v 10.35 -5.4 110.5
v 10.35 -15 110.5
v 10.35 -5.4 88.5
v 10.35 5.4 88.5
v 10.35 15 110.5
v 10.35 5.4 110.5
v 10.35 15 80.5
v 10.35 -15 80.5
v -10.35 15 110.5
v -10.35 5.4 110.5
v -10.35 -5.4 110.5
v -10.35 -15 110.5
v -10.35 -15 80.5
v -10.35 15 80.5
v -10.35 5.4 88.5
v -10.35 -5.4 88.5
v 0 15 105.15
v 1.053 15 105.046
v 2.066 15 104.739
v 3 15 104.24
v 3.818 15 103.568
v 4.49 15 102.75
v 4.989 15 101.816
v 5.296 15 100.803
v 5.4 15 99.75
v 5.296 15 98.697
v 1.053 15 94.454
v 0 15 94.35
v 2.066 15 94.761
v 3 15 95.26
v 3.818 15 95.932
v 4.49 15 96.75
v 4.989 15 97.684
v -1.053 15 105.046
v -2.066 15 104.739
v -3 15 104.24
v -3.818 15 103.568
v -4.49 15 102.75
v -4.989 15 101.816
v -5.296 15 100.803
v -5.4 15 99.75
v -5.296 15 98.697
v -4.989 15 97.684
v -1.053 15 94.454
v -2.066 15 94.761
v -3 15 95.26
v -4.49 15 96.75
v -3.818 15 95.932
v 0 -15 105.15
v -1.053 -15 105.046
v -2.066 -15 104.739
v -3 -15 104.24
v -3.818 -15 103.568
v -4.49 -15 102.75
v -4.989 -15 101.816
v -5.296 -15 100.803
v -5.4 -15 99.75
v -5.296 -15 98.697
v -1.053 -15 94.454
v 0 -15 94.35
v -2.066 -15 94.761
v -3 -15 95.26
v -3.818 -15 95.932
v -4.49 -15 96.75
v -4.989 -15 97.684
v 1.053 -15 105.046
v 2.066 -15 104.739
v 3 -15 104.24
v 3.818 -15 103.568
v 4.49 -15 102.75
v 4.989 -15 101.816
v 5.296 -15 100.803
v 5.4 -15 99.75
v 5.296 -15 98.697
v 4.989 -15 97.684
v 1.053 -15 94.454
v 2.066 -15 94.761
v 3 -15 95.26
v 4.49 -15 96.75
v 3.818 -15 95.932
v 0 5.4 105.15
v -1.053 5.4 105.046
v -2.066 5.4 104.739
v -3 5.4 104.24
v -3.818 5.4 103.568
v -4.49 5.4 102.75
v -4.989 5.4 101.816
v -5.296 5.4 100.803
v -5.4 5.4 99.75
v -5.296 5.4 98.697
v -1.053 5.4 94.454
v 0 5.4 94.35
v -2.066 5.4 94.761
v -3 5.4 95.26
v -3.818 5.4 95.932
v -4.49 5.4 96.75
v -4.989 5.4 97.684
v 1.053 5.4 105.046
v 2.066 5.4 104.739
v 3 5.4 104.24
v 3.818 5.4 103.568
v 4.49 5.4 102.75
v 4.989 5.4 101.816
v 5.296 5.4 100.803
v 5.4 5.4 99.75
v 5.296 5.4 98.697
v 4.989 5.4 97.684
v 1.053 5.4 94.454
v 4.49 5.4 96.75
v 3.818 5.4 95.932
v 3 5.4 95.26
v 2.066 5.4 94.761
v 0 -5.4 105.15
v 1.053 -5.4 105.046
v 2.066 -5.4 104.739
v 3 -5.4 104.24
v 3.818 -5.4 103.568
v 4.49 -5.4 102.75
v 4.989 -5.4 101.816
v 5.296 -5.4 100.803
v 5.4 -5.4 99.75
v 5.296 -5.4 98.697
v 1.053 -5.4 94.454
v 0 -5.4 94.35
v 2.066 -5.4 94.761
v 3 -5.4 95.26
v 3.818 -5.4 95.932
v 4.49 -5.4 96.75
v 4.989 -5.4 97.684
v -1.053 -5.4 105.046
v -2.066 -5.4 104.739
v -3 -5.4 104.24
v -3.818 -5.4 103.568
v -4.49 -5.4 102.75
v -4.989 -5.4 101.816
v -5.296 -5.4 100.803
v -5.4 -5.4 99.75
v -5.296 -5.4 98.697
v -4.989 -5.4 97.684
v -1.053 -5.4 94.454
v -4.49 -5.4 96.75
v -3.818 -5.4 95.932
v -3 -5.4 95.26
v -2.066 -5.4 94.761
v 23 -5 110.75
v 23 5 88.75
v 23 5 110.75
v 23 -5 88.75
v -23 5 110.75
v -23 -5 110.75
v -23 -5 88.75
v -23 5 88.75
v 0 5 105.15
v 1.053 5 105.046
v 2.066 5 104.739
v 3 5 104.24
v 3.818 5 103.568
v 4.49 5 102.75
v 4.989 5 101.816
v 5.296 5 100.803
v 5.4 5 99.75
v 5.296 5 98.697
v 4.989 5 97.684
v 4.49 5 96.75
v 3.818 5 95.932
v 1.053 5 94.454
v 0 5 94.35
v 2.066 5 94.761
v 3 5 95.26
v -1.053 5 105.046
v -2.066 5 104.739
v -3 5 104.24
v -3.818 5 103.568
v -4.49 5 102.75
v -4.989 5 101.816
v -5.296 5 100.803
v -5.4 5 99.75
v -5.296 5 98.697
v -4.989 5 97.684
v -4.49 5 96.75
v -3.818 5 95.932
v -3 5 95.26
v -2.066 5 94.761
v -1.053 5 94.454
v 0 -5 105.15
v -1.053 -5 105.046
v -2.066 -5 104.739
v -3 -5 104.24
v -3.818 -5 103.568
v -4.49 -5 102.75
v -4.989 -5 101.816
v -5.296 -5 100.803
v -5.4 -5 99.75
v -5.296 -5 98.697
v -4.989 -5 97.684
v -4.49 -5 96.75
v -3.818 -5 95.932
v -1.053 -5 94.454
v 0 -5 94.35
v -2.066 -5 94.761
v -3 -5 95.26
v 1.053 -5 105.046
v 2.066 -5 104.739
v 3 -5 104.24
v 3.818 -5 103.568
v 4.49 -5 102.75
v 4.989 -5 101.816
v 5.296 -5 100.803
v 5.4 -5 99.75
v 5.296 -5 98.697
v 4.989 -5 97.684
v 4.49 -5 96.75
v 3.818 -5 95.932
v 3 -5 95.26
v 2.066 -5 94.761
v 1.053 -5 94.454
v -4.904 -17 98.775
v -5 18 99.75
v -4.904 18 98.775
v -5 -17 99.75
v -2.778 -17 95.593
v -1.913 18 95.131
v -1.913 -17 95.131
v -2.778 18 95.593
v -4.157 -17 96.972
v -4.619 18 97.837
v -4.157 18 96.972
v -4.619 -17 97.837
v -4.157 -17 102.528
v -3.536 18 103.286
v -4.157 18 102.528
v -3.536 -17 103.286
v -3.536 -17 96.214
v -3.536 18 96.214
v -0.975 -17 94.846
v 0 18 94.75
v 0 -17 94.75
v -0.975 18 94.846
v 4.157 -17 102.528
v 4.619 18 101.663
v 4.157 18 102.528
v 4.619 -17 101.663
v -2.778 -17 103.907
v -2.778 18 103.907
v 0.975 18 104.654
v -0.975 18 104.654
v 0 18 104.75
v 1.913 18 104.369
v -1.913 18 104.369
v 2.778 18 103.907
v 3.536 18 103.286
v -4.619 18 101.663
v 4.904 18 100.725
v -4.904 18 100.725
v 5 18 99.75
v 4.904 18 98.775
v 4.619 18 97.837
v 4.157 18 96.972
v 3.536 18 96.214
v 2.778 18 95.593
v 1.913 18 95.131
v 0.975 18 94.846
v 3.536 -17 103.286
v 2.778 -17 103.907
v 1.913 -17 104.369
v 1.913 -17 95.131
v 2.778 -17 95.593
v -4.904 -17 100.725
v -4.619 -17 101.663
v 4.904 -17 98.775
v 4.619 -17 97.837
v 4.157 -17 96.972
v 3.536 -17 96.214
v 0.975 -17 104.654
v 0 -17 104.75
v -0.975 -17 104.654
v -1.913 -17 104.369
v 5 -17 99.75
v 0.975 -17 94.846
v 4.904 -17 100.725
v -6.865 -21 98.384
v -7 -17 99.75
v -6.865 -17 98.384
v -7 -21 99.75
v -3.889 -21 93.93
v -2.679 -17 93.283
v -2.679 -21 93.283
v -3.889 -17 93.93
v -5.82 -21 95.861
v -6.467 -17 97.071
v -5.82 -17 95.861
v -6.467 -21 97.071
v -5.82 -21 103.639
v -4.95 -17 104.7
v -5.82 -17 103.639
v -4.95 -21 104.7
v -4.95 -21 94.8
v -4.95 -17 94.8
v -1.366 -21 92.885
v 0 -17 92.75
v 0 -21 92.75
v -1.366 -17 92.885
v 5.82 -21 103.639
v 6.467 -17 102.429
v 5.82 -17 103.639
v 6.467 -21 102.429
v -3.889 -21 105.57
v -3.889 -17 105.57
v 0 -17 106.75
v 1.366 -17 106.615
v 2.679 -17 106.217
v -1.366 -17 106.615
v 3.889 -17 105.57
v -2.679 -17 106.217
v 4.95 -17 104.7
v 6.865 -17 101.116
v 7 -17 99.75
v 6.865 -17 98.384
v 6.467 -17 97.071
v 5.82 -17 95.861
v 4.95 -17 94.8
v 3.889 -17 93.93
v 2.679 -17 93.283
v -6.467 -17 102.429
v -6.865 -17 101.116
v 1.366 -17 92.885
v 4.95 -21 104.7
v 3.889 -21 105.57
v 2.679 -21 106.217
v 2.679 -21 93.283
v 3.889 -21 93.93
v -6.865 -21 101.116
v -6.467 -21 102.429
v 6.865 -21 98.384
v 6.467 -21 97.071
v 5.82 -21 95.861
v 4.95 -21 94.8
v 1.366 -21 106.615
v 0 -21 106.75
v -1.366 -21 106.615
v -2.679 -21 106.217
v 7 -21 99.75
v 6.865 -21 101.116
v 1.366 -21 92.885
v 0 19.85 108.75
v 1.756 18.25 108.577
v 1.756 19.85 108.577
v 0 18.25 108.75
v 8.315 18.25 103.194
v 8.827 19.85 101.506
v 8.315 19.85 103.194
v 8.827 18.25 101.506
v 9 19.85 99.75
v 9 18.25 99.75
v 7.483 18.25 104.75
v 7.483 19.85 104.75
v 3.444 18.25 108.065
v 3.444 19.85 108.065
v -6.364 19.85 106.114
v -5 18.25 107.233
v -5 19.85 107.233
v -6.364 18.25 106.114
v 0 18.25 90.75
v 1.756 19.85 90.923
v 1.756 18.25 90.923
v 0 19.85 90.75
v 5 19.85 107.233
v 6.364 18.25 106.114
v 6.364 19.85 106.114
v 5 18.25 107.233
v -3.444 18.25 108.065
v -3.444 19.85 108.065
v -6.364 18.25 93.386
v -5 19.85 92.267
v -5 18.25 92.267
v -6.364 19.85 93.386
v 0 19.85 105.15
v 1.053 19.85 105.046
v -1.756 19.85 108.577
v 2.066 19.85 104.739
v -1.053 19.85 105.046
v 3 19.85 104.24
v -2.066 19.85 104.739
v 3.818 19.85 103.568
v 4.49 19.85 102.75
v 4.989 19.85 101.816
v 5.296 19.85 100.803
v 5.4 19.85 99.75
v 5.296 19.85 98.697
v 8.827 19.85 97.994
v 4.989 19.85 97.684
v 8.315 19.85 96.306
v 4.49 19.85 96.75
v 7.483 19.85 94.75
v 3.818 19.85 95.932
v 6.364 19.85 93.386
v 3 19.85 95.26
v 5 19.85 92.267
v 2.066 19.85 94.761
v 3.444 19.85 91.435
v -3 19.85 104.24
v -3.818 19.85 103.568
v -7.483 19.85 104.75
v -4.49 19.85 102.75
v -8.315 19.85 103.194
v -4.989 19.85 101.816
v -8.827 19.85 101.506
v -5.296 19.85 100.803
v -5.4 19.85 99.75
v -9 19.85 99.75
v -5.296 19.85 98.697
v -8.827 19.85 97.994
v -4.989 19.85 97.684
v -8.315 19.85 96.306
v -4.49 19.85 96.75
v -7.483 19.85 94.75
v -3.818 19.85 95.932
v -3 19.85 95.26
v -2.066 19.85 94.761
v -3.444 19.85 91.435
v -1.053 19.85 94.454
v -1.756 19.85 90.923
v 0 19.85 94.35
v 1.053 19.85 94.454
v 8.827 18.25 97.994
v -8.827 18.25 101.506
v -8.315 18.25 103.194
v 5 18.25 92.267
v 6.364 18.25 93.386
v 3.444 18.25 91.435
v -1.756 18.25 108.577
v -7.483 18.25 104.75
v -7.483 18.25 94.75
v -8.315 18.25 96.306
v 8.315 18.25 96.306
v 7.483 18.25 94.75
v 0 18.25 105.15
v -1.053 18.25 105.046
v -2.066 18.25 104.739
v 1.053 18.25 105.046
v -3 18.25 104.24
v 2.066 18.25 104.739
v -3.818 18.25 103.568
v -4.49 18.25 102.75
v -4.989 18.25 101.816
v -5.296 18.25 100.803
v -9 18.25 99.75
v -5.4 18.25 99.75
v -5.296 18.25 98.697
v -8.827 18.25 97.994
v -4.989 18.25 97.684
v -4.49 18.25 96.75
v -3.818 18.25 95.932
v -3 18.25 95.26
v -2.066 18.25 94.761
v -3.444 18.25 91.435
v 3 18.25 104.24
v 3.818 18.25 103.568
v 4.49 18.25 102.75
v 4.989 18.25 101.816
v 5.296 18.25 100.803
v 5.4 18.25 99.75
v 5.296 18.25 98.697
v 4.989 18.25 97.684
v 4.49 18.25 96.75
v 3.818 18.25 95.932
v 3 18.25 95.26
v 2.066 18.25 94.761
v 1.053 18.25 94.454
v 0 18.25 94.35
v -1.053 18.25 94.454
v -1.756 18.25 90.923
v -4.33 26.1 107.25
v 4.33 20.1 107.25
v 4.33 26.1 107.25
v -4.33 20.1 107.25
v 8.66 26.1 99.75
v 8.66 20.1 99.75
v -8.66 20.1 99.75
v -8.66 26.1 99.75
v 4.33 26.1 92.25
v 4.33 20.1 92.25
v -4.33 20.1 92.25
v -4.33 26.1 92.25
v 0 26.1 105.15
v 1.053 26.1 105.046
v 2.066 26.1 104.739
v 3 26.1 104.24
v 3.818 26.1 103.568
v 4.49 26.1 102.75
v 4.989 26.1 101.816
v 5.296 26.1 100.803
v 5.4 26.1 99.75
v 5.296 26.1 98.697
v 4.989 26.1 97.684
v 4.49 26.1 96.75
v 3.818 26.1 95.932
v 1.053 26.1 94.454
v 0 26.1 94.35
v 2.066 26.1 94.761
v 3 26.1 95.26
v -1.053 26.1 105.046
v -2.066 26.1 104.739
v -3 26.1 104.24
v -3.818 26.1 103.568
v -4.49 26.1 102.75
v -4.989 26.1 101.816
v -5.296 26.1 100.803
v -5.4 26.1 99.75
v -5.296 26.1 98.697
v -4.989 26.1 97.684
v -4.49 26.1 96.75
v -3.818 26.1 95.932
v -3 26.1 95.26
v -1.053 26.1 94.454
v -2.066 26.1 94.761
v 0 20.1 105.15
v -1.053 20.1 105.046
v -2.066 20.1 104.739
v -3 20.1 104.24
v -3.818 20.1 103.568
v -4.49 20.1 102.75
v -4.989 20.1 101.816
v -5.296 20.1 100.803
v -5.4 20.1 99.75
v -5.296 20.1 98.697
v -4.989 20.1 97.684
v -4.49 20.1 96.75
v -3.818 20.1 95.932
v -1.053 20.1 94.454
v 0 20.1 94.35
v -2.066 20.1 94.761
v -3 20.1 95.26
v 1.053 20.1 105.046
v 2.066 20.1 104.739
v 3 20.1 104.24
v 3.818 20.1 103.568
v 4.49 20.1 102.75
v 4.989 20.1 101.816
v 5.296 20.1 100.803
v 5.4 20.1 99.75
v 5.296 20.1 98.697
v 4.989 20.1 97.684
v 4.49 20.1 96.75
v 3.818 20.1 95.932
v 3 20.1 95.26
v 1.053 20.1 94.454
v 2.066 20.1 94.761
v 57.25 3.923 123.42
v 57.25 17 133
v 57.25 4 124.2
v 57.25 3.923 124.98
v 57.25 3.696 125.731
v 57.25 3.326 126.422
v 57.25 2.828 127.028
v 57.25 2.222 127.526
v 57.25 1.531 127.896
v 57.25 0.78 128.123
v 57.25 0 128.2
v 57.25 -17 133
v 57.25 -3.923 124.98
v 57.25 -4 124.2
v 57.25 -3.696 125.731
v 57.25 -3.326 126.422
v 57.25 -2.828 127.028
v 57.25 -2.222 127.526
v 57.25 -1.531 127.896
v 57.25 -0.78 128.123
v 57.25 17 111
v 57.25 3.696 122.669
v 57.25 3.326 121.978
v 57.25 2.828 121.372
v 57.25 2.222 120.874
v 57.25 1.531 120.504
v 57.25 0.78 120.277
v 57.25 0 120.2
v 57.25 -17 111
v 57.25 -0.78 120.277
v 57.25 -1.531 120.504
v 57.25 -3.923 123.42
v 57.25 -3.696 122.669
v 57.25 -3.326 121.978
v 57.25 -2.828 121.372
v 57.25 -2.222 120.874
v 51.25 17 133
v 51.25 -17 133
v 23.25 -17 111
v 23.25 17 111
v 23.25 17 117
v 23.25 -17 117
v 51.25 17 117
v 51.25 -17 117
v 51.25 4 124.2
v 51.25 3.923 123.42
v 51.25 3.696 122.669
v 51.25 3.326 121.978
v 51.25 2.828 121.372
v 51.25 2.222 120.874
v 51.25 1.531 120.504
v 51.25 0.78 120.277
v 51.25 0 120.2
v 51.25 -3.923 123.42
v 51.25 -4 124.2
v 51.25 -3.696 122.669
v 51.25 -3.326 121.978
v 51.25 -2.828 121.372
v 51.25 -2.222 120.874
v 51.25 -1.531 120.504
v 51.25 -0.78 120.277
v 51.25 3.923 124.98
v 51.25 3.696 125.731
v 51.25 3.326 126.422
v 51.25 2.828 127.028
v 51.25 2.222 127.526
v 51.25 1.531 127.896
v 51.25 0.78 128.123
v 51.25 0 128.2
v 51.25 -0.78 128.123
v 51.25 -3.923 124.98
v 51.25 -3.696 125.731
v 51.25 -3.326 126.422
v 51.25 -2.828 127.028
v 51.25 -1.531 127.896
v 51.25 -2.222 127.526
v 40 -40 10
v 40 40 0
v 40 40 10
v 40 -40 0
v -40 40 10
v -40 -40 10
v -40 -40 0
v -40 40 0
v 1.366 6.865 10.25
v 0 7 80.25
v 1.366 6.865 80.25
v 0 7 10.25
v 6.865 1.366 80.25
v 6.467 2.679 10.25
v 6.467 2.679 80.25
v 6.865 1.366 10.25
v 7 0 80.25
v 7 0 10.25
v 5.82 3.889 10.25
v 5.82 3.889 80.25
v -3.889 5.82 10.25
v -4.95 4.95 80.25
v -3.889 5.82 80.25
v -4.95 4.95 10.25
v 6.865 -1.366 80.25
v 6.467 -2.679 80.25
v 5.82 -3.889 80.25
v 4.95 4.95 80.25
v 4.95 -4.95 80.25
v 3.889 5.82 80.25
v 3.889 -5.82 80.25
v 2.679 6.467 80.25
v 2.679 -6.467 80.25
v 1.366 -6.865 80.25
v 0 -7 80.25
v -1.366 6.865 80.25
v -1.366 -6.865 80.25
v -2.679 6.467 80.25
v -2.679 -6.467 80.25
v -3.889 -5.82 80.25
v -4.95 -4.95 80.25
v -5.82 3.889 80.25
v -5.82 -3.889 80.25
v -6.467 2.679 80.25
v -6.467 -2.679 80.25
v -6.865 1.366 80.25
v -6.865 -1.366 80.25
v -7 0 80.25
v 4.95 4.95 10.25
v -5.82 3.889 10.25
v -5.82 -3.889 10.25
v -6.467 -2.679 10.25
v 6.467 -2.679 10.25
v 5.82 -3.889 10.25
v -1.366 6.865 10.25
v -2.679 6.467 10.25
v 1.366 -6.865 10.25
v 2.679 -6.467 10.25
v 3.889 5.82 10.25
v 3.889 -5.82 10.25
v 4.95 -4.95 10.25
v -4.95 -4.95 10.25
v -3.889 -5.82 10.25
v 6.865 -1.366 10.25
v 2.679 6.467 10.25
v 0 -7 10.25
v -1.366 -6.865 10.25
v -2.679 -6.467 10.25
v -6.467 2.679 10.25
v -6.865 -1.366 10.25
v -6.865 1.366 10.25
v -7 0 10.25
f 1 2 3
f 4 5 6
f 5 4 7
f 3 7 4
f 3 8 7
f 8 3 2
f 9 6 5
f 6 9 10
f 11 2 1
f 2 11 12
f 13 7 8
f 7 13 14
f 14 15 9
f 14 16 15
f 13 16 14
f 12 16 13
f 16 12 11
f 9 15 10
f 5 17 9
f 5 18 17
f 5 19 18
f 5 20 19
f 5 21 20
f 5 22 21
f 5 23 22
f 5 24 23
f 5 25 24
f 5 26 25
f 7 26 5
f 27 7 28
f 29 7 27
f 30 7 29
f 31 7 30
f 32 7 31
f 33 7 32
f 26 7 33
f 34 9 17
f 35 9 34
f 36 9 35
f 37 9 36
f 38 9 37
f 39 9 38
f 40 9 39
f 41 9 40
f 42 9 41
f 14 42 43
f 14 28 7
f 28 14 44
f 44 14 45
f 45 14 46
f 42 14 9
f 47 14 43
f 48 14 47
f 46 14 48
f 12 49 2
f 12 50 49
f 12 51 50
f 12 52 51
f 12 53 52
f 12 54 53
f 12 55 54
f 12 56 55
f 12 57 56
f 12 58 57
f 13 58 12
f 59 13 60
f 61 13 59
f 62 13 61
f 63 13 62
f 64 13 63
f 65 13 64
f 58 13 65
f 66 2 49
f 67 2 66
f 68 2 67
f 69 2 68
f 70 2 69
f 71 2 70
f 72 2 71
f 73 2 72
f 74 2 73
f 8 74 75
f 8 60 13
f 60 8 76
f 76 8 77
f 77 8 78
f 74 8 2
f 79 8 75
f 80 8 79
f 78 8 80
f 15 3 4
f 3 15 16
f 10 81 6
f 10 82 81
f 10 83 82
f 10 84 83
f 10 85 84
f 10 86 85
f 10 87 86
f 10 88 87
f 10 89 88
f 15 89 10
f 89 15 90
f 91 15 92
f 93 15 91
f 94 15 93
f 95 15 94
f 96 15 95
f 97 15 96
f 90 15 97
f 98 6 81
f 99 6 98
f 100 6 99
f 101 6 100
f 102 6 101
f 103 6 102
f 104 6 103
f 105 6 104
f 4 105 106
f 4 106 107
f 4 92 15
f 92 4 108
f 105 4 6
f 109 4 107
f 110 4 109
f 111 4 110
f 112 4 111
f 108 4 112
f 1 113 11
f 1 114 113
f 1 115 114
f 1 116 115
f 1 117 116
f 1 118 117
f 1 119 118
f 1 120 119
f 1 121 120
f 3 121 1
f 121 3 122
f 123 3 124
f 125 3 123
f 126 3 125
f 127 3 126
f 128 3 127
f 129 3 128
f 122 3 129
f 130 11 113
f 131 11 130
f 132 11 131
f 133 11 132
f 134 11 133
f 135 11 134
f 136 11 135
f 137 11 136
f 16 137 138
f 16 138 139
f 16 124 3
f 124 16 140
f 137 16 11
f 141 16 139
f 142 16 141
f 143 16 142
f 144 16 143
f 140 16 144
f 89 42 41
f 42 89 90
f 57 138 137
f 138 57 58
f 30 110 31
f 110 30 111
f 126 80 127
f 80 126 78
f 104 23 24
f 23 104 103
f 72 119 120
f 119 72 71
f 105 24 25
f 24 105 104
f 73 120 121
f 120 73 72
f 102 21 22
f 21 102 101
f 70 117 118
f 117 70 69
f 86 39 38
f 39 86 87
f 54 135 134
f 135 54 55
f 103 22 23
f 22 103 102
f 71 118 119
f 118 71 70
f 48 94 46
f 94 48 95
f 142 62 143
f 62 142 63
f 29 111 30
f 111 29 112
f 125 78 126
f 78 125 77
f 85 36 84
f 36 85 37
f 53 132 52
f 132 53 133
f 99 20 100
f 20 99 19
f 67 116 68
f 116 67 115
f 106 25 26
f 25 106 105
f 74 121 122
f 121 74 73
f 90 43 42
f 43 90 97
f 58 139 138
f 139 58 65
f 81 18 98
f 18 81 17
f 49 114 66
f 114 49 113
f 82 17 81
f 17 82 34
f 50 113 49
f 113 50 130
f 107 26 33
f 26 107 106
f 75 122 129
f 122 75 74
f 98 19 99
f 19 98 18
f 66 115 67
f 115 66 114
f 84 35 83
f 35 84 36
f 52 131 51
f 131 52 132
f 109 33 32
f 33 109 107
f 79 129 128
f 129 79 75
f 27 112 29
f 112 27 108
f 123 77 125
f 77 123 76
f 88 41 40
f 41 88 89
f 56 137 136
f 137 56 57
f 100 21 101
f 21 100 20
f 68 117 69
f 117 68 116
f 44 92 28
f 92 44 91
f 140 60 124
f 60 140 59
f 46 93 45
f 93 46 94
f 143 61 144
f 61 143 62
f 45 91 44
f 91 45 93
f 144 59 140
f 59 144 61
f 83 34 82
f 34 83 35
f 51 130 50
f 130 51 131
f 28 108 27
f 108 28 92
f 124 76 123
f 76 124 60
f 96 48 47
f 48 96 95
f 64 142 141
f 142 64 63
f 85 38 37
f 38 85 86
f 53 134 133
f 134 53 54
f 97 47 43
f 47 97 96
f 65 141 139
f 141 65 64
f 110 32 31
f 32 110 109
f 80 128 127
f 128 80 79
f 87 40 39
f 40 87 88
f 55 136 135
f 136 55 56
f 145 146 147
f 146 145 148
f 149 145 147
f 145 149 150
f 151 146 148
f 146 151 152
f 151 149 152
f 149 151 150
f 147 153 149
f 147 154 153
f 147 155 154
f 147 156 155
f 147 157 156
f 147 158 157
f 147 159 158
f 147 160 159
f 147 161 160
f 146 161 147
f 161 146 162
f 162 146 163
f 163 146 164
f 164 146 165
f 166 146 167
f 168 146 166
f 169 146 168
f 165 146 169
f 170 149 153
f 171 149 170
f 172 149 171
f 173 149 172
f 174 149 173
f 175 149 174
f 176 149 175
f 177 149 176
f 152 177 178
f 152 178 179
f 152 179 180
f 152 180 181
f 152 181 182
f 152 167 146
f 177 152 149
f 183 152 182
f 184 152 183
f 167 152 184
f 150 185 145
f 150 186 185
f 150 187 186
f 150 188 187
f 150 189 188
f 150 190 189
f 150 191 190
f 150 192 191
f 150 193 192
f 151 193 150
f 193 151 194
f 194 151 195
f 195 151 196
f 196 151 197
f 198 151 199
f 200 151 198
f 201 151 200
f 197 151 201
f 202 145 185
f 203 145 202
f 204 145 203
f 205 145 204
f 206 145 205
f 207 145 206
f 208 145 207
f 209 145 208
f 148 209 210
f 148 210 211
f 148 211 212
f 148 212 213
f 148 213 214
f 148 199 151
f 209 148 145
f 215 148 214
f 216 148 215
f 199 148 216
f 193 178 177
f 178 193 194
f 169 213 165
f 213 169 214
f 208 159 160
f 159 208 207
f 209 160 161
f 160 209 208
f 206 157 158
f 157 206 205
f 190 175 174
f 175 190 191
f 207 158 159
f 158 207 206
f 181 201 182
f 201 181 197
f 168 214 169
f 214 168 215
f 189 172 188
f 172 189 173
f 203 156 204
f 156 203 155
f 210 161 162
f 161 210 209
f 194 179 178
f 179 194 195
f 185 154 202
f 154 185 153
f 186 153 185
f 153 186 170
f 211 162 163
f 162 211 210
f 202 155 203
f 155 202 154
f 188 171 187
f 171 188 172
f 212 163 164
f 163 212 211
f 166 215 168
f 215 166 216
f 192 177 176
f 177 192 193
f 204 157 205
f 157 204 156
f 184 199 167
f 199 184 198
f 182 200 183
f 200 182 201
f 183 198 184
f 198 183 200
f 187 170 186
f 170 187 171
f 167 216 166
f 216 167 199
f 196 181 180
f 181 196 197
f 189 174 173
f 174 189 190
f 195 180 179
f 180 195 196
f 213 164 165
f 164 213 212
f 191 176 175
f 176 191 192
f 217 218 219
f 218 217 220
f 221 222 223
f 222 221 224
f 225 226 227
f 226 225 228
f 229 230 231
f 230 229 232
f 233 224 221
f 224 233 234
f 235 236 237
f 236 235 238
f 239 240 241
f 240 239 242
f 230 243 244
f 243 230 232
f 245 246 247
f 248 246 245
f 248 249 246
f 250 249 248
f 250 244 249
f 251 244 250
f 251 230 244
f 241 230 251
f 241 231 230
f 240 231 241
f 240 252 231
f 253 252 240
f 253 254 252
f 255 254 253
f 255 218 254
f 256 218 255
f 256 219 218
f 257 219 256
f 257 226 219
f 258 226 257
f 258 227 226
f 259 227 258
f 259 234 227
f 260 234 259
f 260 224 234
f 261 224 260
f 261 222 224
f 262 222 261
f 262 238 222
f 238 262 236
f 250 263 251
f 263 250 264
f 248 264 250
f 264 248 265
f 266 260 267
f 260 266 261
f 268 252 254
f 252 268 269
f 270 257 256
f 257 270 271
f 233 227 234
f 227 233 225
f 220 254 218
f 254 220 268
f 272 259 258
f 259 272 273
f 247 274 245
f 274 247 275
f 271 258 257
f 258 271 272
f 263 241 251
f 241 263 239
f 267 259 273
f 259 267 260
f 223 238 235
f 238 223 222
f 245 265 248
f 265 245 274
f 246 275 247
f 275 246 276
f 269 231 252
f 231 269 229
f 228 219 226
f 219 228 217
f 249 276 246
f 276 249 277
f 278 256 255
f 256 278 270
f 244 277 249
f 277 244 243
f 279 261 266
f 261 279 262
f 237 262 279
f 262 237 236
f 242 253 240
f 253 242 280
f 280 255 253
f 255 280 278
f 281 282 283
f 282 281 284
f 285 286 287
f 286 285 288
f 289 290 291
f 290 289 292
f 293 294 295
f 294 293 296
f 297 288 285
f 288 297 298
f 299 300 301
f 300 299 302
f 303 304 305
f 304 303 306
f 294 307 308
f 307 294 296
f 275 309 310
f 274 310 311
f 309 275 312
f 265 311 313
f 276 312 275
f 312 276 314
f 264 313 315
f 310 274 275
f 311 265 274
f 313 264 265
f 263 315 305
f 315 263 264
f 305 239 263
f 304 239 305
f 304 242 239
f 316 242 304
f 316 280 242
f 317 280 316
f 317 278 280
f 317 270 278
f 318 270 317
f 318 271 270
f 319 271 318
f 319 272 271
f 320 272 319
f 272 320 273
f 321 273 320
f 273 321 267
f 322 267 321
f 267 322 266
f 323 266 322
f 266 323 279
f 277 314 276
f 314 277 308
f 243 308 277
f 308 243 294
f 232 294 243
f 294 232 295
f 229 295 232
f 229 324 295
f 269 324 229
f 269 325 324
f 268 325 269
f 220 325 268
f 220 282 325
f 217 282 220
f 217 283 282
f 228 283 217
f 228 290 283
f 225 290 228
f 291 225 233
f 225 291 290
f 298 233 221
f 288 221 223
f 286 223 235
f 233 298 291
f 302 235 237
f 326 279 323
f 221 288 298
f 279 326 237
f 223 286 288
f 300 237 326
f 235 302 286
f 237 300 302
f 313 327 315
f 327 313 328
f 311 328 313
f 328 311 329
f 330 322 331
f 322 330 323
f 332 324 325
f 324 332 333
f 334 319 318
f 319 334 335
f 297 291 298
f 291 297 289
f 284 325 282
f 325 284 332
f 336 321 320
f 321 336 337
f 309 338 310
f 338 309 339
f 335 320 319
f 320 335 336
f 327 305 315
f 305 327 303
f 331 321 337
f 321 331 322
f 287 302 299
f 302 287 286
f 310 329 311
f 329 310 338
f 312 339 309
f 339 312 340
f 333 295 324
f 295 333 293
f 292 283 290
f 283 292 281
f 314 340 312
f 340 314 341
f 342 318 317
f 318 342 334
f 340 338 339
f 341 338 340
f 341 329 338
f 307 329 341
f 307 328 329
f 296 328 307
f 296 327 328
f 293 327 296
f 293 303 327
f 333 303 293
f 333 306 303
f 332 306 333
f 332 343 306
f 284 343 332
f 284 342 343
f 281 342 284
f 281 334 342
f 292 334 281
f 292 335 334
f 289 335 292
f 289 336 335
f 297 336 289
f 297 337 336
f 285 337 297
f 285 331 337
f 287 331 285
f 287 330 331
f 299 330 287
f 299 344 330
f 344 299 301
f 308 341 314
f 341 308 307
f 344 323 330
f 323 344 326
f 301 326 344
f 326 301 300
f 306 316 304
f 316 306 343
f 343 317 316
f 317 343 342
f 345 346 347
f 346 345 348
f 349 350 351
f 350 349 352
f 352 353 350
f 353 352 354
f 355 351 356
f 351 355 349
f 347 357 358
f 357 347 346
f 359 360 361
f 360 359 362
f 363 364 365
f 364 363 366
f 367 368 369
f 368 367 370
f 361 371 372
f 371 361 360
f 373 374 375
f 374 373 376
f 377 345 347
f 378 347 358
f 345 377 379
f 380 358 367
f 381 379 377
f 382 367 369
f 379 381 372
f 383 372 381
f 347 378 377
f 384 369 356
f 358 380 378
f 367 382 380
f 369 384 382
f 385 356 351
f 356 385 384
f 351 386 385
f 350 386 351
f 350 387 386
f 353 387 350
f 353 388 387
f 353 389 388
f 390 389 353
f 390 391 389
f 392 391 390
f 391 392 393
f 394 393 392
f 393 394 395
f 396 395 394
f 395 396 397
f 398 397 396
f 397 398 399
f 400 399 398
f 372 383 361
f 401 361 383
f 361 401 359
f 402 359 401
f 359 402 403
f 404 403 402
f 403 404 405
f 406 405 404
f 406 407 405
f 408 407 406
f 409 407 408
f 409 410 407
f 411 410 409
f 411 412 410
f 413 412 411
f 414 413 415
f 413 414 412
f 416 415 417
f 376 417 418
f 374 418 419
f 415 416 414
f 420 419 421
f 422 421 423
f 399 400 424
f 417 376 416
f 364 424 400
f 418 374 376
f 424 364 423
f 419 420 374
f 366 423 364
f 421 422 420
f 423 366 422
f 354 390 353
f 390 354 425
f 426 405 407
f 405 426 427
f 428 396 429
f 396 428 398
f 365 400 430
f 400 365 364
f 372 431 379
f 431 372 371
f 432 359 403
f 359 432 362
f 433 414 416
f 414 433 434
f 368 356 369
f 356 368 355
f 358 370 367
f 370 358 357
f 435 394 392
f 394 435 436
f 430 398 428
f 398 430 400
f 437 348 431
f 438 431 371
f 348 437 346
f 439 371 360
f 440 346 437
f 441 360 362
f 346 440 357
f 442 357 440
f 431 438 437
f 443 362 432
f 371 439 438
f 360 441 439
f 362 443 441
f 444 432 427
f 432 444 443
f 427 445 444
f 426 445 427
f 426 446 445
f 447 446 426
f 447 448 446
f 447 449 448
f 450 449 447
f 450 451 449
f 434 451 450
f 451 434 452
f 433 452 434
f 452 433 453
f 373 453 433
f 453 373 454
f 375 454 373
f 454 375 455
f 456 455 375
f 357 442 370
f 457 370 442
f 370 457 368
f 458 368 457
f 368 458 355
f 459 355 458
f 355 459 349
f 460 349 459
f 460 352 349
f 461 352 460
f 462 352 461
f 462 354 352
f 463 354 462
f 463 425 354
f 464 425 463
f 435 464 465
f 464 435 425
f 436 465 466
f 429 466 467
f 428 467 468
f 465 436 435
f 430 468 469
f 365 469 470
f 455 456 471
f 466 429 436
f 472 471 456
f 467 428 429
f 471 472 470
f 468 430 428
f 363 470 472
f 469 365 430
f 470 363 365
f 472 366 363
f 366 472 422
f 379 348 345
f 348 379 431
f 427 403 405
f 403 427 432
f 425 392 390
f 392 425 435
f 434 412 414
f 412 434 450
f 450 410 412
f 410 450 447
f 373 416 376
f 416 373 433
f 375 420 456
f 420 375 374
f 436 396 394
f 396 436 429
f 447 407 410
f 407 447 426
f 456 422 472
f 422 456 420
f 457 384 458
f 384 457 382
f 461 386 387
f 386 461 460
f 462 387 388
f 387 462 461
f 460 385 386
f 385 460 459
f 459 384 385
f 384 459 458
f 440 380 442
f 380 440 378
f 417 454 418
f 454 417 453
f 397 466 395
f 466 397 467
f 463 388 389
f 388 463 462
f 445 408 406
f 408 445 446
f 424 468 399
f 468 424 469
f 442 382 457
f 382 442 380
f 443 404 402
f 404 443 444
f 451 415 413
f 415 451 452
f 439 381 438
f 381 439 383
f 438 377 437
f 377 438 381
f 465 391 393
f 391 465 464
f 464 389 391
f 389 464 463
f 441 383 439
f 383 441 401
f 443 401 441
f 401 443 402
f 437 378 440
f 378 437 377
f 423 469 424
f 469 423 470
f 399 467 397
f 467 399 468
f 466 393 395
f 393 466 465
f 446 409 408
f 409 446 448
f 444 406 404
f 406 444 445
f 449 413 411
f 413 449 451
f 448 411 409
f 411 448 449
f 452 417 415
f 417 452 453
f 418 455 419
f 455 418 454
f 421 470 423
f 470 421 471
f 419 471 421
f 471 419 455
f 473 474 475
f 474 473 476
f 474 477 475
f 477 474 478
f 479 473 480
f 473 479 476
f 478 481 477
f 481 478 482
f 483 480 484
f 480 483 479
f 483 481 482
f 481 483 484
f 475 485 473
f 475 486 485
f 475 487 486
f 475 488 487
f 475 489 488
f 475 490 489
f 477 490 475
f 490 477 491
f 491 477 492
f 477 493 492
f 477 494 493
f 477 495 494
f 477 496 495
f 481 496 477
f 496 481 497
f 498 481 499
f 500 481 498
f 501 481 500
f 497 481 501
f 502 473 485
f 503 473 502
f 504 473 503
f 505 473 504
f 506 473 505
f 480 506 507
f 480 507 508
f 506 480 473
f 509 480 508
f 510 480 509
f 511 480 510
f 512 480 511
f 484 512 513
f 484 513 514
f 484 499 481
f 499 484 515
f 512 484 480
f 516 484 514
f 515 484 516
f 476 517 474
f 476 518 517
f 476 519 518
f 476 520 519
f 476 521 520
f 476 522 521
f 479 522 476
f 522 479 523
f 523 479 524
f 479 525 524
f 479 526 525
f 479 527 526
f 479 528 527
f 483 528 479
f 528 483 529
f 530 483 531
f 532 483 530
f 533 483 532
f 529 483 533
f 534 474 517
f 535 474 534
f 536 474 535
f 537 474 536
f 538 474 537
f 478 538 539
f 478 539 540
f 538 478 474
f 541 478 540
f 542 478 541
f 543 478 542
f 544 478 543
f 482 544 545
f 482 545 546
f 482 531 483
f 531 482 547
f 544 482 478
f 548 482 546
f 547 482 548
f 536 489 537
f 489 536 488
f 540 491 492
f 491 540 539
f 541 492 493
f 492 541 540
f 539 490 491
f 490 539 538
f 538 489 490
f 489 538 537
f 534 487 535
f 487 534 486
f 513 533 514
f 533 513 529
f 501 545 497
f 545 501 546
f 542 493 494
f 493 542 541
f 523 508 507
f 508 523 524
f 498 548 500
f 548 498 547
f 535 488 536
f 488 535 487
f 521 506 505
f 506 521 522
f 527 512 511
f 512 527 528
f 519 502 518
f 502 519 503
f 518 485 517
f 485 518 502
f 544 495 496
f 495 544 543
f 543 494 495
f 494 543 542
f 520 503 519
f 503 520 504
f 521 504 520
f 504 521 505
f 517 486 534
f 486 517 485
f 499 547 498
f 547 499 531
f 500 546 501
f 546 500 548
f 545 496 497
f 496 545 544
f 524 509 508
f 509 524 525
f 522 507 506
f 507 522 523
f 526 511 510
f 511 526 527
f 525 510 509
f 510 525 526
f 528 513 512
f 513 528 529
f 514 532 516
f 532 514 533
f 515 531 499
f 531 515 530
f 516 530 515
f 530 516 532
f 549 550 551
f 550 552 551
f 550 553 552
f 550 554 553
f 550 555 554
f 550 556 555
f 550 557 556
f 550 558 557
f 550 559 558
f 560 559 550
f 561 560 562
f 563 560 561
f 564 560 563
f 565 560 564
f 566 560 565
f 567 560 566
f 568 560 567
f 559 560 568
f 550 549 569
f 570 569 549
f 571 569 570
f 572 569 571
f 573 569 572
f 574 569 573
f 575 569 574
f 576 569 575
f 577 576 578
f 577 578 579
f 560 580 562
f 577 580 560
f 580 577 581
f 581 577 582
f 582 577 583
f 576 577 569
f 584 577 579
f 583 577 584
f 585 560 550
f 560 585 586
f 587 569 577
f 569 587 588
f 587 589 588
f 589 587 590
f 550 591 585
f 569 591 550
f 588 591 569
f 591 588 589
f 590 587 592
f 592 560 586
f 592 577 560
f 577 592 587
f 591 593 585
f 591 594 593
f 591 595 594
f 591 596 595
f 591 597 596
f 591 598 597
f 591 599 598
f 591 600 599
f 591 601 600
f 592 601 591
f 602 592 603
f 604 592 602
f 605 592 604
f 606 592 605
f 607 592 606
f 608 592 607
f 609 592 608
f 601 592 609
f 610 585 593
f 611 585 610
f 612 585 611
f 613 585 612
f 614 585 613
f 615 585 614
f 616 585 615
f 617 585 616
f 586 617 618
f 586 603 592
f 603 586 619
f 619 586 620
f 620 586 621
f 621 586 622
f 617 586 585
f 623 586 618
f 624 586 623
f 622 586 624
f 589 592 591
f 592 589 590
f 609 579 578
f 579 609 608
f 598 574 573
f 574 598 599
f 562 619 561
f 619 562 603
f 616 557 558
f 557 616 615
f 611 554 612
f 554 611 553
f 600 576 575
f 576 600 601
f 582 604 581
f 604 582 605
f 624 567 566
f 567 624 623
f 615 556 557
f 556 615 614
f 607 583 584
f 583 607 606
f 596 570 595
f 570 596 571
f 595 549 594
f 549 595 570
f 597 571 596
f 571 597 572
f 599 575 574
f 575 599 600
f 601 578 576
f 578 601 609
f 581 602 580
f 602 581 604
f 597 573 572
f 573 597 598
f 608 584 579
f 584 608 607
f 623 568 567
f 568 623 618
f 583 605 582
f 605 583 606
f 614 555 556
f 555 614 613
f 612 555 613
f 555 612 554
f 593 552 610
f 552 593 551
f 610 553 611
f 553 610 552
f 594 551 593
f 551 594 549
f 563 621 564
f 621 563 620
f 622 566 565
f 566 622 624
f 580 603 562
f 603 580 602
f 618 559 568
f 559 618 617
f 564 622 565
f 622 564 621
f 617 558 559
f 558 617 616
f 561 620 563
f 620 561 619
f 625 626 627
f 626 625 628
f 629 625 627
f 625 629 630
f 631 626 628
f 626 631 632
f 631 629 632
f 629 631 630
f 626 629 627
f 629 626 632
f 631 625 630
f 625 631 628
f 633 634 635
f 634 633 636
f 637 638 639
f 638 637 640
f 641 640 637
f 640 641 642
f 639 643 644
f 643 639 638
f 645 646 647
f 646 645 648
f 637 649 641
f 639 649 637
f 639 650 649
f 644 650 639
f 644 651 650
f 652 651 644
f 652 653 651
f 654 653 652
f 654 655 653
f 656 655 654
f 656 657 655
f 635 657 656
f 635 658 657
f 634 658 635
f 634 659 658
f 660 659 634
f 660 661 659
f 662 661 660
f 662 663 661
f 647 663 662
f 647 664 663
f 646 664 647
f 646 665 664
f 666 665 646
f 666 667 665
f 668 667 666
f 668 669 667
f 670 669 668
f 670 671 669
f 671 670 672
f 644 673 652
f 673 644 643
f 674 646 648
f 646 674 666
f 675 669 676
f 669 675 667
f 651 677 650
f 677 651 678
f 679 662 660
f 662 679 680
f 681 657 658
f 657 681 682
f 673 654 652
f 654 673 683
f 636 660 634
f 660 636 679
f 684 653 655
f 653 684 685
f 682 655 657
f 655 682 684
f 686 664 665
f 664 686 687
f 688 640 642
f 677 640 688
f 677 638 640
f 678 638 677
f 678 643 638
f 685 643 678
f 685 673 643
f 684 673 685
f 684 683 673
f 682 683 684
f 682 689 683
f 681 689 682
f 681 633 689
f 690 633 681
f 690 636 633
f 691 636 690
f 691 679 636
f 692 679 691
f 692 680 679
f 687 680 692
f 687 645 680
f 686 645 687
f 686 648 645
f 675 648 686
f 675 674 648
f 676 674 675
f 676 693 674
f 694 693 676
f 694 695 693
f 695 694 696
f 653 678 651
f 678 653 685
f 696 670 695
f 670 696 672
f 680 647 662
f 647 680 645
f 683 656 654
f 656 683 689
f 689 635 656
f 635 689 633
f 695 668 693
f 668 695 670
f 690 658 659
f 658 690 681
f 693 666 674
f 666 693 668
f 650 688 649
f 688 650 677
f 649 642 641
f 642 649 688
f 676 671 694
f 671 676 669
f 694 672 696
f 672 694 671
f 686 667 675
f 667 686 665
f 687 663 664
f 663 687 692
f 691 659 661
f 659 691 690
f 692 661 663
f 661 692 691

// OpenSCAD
$fn = 32;

// ------------------------------------------------------------------------
// Lamp arm: column d14 x 70 mm, arm 46 mm
// Every part is its own module, assembly() places every instance.
// ------------------------------------------------------------------------

// --- part 1 ---
module lamp_base() {
  difference() {
    translate([-40, -40, 0]) cube([80, 80, 10]);
  }
}

// --- part 2 ---
module lamp_column() {
  cylinder(h = 70, d = 14);
}

// --- part 3 ---
module head_fork() {
  difference() {
    translate([-10.35, -15, 0]) cube([20.7, 30, 30]);
    translate([-11.35, -5.4, 8]) cube([22.7, 10.8, 23]);
    translate([0, 0, 19.25]) rotate([90, 0, 0]) cylinder(h = 32, d = 10.8, center = true);
  }
}

// --- part 4 ---
module lamp_arm() {
  difference() {
    translate([-23, -5, 0]) cube([46, 10, 22]);
    translate([0, 0, 11]) rotate([90, 0, 0]) cylinder(h = 12, d = 10.8, center = true);
  }
}

// --- part 5 ---
module arm_pin() {
  rotate([0, 90, 0]) cylinder(h = 36, d = 10, center = true);
  translate([-21, 0, 0]) rotate([0, 90, 0]) cylinder(h = 4, d = 14);
}

// --- part 6 ---
module arm_washer() {
  difference() {
      translate([0, 0, 0]) cylinder(h = 1.6, d = 18);
      translate([0, 0, -1]) cylinder(h = 3.6, d = 10.8);
    }
}

// --- part 7 ---
module arm_nut() {
  difference() {
    linear_extrude(height = 6) polygon(points = [[8.66, 0], [4.33, 7.5], [-4.33, 7.5], [-8.66, 0], [-4.33, -7.5], [4.33, -7.5]]);
    translate([0, 0, -1]) cylinder(h = 8, d = 10.8);
  }
}

// --- part 8 ---
module shade_bracket() {
  difference() {
    translate([-17, -17, 0]) cube([34, 34, 22]);
    translate([-18, -18, 6]) cube([29, 36, 17]);
    translate([14, 0, 13.2]) rotate([0, 90, 0]) cylinder(h = 8, d = 8, center = true);
  }
}

// --- assembly ---
module assembly() {
  color([0.80, 0.24, 0.20]) translate([0, 0, 0]) rotate([0, 0, 0]) lamp_base();
  color([0.20, 0.45, 0.75]) translate([0, 0, 10.25]) rotate([0, 0, 0]) lamp_column();
  color([0.25, 0.62, 0.32]) translate([0, 0, 80.5]) rotate([0, 0, 0]) head_fork();
  color([0.92, 0.70, 0.18]) translate([0, 0, 88.75]) rotate([0, 0, 0]) lamp_arm();
  color([0.58, 0.35, 0.70]) translate([0, 0, 99.75]) rotate([0, 0, 90]) arm_pin();
  color([0.16, 0.66, 0.66]) translate([0, 19.85, 99.75]) rotate([90, 0, 0]) arm_washer();
  color([0.85, 0.48, 0.18]) translate([0, 26.1, 99.75]) rotate([90, 0, 0]) arm_nut();
  color([0.55, 0.60, 0.65]) translate([40.25, 0, 111]) rotate([0, 0, 0]) shade_bracket();
}

assembly();
